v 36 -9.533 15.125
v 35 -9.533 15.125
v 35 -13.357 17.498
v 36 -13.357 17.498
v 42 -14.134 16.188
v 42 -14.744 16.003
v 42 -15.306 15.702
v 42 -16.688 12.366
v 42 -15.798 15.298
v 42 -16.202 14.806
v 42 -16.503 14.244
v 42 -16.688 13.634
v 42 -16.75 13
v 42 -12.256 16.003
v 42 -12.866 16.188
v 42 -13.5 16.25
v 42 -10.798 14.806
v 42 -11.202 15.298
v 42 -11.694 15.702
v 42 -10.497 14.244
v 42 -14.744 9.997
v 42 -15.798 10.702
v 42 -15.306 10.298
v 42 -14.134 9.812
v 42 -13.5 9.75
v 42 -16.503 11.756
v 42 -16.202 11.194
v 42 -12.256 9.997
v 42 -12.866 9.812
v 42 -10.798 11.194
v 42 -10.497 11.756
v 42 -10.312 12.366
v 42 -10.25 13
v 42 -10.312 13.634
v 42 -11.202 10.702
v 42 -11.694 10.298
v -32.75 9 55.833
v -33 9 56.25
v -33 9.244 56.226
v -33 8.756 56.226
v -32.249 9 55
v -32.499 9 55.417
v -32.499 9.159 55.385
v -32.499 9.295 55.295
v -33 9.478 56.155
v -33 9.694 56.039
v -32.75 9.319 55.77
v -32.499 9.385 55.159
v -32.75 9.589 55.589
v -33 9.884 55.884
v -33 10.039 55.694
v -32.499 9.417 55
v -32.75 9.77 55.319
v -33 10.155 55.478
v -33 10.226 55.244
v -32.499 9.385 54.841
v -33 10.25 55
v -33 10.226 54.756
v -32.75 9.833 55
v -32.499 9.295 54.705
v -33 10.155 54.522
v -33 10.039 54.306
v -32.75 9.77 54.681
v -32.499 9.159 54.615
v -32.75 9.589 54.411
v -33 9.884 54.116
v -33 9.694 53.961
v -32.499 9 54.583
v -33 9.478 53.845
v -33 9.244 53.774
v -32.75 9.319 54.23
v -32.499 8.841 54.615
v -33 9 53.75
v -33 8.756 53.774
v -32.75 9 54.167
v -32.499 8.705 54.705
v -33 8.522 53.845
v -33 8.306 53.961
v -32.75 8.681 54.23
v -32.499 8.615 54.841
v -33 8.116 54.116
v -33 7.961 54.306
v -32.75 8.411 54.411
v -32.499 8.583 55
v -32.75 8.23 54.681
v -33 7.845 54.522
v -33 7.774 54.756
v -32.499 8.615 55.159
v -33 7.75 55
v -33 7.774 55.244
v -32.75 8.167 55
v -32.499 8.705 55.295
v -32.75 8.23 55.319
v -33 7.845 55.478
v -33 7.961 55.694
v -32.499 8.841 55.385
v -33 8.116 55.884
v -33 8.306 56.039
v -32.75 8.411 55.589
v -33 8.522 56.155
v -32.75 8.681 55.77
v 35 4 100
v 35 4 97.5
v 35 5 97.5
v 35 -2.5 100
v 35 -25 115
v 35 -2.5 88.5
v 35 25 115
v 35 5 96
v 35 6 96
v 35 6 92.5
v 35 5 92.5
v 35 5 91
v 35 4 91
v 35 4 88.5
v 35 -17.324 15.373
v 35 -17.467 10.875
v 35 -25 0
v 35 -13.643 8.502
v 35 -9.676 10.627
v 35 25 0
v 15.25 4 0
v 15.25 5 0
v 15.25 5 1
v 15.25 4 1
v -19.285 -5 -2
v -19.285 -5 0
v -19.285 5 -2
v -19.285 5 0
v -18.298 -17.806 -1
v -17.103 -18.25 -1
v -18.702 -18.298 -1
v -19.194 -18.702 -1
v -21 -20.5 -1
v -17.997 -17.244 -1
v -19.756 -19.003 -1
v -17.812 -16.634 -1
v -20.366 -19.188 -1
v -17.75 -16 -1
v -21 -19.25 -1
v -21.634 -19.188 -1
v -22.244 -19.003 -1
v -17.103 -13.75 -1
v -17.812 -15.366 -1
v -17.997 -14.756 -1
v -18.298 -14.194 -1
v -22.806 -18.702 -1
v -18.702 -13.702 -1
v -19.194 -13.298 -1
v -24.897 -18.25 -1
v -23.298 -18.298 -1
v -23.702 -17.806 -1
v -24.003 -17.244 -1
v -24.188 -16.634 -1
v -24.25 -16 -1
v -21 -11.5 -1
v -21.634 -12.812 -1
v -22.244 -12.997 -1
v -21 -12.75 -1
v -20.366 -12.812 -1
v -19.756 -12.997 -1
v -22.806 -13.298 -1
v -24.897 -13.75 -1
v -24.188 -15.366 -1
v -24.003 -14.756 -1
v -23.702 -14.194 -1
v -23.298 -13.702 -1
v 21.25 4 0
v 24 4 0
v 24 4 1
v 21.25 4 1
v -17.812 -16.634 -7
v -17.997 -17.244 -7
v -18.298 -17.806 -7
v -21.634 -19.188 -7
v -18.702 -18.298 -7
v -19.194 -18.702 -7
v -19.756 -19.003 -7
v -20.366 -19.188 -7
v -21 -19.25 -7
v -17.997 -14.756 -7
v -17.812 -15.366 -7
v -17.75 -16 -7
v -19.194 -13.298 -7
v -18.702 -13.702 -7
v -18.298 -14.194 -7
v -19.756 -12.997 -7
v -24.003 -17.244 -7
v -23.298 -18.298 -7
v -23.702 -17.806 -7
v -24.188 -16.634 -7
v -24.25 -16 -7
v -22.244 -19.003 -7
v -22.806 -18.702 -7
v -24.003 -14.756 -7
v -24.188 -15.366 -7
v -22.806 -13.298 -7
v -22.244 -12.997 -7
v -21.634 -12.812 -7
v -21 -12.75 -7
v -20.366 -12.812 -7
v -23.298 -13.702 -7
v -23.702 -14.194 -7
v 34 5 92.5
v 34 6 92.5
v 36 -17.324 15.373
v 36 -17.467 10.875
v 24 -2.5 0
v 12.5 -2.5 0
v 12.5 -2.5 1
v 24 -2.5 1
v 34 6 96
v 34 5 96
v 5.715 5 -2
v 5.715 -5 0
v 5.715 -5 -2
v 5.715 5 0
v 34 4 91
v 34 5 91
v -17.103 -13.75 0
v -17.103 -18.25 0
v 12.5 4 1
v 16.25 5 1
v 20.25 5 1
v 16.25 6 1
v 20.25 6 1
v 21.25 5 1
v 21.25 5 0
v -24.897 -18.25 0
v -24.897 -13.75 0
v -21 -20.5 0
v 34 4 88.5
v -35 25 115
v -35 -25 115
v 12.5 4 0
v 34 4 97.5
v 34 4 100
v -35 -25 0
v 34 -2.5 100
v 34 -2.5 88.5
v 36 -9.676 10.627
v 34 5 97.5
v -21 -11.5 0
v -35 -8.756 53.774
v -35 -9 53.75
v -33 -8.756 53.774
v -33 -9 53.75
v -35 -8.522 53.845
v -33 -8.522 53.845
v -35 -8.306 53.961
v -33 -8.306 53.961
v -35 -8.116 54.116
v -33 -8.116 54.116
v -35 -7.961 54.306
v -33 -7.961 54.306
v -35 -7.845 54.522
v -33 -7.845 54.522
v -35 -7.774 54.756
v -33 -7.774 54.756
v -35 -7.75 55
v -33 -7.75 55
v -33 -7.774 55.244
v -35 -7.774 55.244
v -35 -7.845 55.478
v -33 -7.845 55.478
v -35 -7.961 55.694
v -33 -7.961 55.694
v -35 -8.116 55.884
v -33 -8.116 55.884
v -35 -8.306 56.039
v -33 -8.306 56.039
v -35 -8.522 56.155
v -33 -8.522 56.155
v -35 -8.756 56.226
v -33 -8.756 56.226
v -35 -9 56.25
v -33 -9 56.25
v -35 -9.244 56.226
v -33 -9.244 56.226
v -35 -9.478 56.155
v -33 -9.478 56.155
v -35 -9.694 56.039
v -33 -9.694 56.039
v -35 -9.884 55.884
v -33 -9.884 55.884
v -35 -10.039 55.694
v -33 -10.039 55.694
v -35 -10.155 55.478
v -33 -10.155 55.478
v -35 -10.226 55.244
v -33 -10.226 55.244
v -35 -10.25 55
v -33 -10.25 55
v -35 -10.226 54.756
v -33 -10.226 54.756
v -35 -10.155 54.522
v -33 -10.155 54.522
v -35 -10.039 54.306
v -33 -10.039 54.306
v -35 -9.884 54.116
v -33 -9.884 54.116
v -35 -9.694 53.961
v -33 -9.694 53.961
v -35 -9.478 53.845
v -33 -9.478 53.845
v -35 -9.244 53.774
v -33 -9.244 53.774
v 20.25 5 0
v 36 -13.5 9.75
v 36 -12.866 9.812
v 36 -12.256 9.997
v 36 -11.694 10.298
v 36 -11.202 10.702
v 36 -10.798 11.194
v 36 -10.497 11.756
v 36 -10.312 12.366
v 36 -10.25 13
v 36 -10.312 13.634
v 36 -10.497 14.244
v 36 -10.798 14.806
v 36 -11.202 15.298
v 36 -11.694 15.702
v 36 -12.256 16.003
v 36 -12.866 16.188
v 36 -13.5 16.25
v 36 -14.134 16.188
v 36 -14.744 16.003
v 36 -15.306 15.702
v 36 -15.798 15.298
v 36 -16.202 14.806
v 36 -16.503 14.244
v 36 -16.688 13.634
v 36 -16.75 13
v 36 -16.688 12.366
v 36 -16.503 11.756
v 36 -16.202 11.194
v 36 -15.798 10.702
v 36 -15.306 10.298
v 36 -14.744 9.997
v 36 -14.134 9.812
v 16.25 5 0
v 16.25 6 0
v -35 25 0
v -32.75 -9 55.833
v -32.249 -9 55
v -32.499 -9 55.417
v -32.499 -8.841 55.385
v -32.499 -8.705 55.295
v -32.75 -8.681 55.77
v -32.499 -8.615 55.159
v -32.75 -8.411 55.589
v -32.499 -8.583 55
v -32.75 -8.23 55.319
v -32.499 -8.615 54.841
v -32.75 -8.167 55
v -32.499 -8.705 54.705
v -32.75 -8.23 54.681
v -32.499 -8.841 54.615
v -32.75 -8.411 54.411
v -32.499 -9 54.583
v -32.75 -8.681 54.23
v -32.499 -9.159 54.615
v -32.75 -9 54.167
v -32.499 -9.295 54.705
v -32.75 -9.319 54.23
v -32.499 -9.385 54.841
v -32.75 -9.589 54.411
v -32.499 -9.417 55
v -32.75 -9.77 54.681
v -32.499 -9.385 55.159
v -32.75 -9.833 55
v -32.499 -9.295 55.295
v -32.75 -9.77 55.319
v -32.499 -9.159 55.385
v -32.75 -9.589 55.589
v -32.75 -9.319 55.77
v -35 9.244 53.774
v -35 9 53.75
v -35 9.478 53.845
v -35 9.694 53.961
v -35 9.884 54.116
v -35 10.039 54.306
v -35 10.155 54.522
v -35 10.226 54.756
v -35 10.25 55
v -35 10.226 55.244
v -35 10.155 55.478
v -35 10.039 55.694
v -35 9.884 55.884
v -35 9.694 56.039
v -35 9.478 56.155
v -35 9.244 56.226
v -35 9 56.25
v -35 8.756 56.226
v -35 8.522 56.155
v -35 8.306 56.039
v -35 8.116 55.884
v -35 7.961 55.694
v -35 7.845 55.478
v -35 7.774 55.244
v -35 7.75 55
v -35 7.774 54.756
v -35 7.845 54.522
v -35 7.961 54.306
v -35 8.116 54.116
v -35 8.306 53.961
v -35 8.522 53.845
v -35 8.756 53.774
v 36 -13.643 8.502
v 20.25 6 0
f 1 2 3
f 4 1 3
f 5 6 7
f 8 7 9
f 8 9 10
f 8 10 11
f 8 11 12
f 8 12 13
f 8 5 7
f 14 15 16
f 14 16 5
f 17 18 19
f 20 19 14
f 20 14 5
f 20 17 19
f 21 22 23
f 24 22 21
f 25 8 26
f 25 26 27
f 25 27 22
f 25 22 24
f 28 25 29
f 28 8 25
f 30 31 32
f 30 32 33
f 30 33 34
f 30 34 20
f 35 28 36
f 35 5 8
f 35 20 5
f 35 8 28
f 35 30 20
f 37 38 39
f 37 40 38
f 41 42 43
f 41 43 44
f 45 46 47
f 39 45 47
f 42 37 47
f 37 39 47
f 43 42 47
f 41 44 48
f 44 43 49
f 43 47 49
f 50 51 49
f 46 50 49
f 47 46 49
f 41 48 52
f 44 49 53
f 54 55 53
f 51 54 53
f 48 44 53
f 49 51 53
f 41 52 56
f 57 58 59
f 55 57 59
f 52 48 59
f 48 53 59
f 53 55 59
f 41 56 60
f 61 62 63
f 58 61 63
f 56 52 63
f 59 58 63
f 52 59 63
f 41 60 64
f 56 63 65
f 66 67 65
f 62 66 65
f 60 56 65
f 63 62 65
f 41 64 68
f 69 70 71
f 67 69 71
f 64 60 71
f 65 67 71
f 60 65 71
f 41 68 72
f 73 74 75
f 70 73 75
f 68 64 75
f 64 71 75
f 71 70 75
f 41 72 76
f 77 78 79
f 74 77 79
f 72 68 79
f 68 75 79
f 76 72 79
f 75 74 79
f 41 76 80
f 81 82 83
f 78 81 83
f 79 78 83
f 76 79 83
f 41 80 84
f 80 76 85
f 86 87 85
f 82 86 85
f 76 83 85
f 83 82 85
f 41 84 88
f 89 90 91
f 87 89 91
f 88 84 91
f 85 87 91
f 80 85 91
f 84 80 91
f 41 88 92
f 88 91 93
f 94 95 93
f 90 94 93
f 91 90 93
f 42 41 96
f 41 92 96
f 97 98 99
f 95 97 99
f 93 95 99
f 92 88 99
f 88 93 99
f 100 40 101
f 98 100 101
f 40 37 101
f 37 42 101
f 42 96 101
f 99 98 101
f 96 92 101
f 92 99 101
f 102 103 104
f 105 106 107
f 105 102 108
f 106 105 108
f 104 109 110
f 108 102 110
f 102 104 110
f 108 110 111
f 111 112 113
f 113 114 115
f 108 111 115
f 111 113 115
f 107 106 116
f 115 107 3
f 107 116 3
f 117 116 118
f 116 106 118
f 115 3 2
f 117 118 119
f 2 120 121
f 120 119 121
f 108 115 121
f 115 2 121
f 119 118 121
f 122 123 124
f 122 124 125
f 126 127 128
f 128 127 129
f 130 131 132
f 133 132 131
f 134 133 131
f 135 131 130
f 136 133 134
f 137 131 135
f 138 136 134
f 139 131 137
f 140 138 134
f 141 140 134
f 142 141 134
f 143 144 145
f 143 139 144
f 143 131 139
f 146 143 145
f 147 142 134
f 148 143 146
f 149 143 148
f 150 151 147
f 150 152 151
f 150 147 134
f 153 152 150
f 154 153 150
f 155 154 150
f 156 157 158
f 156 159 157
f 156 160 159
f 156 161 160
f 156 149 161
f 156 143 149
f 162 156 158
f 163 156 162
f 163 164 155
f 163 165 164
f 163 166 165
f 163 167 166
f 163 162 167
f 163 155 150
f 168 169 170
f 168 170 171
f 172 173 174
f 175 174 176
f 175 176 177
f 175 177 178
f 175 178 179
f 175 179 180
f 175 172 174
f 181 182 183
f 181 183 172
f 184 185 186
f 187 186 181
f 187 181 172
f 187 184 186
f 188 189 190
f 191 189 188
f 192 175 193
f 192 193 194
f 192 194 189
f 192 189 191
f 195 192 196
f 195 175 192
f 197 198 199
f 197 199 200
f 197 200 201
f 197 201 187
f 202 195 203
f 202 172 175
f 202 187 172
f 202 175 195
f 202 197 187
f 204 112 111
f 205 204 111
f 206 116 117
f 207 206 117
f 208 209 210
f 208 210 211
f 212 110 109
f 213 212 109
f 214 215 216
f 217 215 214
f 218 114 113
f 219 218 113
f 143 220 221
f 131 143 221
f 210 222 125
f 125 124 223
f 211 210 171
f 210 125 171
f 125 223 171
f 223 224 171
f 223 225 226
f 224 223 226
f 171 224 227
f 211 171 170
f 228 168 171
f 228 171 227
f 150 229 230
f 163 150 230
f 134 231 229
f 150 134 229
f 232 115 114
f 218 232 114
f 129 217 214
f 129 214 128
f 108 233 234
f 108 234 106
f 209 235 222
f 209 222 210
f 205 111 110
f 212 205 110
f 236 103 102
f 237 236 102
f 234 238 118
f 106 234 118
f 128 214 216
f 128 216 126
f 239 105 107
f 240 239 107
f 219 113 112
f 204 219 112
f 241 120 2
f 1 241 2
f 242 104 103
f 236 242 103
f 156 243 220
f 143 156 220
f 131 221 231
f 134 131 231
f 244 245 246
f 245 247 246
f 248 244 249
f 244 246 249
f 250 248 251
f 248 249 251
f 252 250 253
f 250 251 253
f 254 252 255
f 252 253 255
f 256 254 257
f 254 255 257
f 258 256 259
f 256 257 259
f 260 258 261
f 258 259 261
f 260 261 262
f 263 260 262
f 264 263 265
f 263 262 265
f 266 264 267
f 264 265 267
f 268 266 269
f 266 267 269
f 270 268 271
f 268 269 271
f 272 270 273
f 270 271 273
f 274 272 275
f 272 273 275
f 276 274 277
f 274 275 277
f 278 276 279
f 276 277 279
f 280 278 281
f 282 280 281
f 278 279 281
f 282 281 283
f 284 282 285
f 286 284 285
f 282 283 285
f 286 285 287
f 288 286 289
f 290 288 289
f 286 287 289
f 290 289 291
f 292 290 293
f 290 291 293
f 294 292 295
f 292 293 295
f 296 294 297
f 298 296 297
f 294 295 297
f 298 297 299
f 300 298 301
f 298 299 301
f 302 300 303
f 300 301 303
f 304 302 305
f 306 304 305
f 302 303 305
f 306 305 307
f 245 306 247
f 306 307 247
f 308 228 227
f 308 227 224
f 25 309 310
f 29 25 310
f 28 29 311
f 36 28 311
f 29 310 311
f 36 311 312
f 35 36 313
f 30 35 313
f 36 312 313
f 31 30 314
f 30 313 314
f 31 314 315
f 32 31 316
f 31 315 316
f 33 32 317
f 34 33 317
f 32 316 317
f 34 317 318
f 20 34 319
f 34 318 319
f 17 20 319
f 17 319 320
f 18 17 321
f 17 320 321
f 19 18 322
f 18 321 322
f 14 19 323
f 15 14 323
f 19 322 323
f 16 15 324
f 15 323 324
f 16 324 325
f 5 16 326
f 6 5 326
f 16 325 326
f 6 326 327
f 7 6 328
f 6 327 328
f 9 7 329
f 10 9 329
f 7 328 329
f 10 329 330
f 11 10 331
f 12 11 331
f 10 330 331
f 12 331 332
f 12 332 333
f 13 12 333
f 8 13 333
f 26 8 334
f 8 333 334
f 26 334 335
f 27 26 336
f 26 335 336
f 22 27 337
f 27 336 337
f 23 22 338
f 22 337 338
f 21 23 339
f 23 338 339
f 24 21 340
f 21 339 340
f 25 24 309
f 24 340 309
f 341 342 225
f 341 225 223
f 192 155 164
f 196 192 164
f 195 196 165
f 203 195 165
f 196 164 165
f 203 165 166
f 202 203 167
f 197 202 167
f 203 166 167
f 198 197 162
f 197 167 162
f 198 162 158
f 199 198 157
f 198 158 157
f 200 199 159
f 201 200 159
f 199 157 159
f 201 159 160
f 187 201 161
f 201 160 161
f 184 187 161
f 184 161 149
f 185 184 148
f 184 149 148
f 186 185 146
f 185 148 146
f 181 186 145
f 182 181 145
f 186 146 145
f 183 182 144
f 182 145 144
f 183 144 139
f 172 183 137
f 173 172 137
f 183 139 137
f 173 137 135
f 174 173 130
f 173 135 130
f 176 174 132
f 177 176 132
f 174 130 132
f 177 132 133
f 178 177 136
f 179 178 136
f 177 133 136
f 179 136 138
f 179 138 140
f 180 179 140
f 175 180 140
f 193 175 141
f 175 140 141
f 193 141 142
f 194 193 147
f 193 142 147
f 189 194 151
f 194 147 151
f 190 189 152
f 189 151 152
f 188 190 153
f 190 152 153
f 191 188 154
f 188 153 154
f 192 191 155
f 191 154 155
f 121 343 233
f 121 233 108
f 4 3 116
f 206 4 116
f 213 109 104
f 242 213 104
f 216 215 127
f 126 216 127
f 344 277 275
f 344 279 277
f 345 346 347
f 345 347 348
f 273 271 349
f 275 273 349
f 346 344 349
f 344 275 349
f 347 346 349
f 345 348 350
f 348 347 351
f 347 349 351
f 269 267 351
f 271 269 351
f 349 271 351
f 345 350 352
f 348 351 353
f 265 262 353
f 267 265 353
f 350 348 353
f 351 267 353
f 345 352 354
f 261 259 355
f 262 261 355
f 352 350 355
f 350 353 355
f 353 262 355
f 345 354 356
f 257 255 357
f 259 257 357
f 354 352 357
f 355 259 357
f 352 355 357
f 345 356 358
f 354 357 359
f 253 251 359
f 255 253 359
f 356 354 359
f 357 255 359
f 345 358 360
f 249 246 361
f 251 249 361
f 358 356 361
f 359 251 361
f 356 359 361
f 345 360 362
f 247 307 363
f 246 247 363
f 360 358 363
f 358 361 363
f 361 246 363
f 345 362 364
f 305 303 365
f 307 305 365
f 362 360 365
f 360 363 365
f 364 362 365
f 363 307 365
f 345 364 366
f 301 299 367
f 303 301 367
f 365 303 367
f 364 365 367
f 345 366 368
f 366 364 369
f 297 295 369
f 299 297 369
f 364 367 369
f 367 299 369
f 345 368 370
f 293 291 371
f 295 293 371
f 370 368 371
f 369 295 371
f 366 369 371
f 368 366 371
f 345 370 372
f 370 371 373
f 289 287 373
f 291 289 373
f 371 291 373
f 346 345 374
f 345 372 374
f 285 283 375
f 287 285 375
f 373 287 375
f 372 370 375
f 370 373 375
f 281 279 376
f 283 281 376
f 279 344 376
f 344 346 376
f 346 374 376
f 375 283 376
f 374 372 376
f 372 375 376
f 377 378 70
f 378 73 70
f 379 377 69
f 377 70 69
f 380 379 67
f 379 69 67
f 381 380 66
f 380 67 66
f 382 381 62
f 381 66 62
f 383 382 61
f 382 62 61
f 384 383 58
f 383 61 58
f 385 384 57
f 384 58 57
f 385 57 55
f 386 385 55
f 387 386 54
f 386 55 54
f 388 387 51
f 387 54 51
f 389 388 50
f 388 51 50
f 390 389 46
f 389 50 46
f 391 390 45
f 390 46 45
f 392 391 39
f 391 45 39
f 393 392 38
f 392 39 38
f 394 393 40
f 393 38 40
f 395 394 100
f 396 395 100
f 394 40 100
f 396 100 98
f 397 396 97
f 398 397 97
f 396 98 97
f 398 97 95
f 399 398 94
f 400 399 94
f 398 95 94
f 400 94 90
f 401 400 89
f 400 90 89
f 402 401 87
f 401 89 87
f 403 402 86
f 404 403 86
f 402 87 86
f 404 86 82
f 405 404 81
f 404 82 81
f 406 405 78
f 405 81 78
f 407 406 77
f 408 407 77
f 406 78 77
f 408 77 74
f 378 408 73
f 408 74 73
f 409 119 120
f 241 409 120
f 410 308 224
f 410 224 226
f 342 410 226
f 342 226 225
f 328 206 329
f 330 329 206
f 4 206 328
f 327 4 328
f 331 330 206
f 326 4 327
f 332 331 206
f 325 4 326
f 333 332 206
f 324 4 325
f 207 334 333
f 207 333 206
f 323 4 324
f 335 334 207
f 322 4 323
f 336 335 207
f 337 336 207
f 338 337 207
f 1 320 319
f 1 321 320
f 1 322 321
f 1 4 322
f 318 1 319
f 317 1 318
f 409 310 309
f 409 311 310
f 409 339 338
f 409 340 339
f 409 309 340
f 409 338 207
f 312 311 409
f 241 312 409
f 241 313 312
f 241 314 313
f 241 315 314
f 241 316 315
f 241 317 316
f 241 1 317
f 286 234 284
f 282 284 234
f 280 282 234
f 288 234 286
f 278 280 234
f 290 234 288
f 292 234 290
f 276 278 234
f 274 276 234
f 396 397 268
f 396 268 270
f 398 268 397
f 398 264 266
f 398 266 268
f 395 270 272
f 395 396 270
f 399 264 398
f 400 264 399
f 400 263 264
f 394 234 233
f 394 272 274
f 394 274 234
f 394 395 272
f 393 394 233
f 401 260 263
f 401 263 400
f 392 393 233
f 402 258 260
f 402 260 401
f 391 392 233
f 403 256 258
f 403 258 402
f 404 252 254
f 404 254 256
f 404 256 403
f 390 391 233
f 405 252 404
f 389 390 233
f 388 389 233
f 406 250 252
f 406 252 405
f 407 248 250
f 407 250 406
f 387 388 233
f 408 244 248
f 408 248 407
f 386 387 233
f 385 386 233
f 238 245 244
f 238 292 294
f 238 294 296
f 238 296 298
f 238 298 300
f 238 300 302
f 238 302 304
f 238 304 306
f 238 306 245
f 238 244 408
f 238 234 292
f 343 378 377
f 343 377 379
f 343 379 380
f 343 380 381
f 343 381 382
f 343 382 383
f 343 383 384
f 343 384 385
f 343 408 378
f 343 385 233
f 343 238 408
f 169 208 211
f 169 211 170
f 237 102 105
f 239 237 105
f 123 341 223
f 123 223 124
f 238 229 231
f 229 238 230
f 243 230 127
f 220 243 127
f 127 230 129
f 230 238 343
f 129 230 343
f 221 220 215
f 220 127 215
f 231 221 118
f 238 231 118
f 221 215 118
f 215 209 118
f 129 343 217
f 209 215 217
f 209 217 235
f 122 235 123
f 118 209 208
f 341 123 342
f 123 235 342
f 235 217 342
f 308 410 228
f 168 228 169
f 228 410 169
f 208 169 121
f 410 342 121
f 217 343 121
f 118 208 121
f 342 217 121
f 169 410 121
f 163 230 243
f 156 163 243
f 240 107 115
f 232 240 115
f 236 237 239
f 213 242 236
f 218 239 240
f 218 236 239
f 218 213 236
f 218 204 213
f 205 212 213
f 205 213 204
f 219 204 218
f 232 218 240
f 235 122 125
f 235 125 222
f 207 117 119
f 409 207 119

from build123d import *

# Parameters (mm, degrees)
SKETCH_1_W             = 70
SKETCH_1_H             = 50
EXTRUDE_1_DEPTH        = 115
CUT_EXTRUDE_1_DEPTH    = 1
EXTRUDE_2_DEPTH        = 1
SKETCH_4_R             = 3.25
EXTRUDE_3_DEPTH        = 6
EXTRUDE_4_DEPTH        = 1
SKETCH_6_R             = 3.25
EXTRUDE_5_DEPTH        = 6
CUT_EXTRUDE_2_DEPTH    = 1
HOLE_WIZARD_M3_1_D     = 2.5
HOLE_WIZARD_M3_1_DEPTH = 2
HOLE_WIZARD_M3_1_TIP   = 0.751075774
SKETCH_10_W            = 25
SKETCH_10_H            = 10
EXTRUDE_6_DEPTH        = 2


with BuildPart() as part:
    # 草图1 → 凸台-拉伸1 (new body)
    with BuildSketch(Plane.XY):
        Rectangle(SKETCH_1_W, SKETCH_1_H)
    extrude(amount=EXTRUDE_1_DEPTH)

    # 草图2 → 切除-拉伸1 (cut)
    with BuildSketch(Plane(origin=(35, 0, 0), x_dir=(0, 0, -1), z_dir=(1, 0, 0))):
        Polygon((-100, -2.5), (-88.5, -2.5), (-88.5, 4), (-91, 4), (-91, 5), (-92.5, 5), (-92.5, 6), (-96, 6), (-96, 5), (-97.5, 5), (-97.5, 4), (-100, 4), align=None)
    extrude(amount=-CUT_EXTRUDE_1_DEPTH, mode=Mode.SUBTRACT)

    # 草图3 → 凸台-拉伸2 (add)
    with BuildSketch(Plane(origin=(35, 0, 0), x_dir=(0, 0, -1), z_dir=(1, 0, 0))):
        Polygon((-15.124996356, -9.533340135), (-17.49772639, -13.356970895), (-15.372730033, -17.32363076), (-10.875003644, -17.466659865), (-8.50227361, -13.643029105), (-10.627269967, -9.67636924), align=None)
    extrude(amount=EXTRUDE_2_DEPTH)

    # 草图4 → 凸台-拉伸3 (add)
    with BuildSketch(Plane(origin=(36, 0, 0), x_dir=(0, 0, -1), z_dir=(1, 0, 0))):
        with Locations((-13, -13.5)):
            Circle(SKETCH_4_R)
    extrude(amount=EXTRUDE_3_DEPTH)

    # 草图5 → 凸台-拉伸4 (add)
    with BuildSketch(Plane(origin=(0, 0, 0), x_dir=(-1, 0, 0), z_dir=(0, 0, -1))):
        Polygon((24.897114317, -18.25), (24.897114317, -13.75), (21, -11.5), (17.102885683, -13.75), (17.102885683, -18.25), (21, -20.5), align=None)
    extrude(amount=EXTRUDE_4_DEPTH)

    # 草图6 → 凸台-拉伸5 (add)
    with BuildSketch(Plane(origin=(0, 0, -1), x_dir=(-1, 0, 0), z_dir=(0, 0, -1))):
        with Locations((21, -16)):
            Circle(SKETCH_6_R)
    extrude(amount=EXTRUDE_5_DEPTH)

    # 草图7 → 切除-拉伸2 (cut)
    with BuildSketch(Plane(origin=(0, 0, 0), x_dir=(-1, 0, 0), z_dir=(0, 0, -1))):
        Polygon((-24, 4), (-21.25, 4), (-21.25, 5), (-20.25, 5), (-20.25, 6), (-16.25, 6), (-16.25, 5), (-15.25, 5), (-15.25, 4), (-12.5, 4), (-12.5, -2.5), (-24, -2.5), align=None)
    extrude(amount=-CUT_EXTRUDE_2_DEPTH, mode=Mode.SUBTRACT)

    # M3 螺纹孔的螺纹孔钻头1
    with Locations(Plane.ZY.offset(35)):
        with Locations((55, -9), (55, 9)):
            Hole(HOLE_WIZARD_M3_1_D / 2, depth=HOLE_WIZARD_M3_1_DEPTH)
            with Locations((0, 0, -(HOLE_WIZARD_M3_1_DEPTH + HOLE_WIZARD_M3_1_TIP / 2))):  # 118° drill point
                Cone(0, HOLE_WIZARD_M3_1_D / 2, HOLE_WIZARD_M3_1_TIP, mode=Mode.SUBTRACT)

    # 草图10 → 凸台-拉伸6 (add)
    with BuildSketch(Plane(origin=(0, 0, 0), x_dir=(-1, 0, 0), z_dir=(0, 0, -1))):
        with Locations((6.785143616, 0)):
            Rectangle(SKETCH_10_W, SKETCH_10_H)
    extrude(amount=EXTRUDE_6_DEPTH)


solid = part.part
